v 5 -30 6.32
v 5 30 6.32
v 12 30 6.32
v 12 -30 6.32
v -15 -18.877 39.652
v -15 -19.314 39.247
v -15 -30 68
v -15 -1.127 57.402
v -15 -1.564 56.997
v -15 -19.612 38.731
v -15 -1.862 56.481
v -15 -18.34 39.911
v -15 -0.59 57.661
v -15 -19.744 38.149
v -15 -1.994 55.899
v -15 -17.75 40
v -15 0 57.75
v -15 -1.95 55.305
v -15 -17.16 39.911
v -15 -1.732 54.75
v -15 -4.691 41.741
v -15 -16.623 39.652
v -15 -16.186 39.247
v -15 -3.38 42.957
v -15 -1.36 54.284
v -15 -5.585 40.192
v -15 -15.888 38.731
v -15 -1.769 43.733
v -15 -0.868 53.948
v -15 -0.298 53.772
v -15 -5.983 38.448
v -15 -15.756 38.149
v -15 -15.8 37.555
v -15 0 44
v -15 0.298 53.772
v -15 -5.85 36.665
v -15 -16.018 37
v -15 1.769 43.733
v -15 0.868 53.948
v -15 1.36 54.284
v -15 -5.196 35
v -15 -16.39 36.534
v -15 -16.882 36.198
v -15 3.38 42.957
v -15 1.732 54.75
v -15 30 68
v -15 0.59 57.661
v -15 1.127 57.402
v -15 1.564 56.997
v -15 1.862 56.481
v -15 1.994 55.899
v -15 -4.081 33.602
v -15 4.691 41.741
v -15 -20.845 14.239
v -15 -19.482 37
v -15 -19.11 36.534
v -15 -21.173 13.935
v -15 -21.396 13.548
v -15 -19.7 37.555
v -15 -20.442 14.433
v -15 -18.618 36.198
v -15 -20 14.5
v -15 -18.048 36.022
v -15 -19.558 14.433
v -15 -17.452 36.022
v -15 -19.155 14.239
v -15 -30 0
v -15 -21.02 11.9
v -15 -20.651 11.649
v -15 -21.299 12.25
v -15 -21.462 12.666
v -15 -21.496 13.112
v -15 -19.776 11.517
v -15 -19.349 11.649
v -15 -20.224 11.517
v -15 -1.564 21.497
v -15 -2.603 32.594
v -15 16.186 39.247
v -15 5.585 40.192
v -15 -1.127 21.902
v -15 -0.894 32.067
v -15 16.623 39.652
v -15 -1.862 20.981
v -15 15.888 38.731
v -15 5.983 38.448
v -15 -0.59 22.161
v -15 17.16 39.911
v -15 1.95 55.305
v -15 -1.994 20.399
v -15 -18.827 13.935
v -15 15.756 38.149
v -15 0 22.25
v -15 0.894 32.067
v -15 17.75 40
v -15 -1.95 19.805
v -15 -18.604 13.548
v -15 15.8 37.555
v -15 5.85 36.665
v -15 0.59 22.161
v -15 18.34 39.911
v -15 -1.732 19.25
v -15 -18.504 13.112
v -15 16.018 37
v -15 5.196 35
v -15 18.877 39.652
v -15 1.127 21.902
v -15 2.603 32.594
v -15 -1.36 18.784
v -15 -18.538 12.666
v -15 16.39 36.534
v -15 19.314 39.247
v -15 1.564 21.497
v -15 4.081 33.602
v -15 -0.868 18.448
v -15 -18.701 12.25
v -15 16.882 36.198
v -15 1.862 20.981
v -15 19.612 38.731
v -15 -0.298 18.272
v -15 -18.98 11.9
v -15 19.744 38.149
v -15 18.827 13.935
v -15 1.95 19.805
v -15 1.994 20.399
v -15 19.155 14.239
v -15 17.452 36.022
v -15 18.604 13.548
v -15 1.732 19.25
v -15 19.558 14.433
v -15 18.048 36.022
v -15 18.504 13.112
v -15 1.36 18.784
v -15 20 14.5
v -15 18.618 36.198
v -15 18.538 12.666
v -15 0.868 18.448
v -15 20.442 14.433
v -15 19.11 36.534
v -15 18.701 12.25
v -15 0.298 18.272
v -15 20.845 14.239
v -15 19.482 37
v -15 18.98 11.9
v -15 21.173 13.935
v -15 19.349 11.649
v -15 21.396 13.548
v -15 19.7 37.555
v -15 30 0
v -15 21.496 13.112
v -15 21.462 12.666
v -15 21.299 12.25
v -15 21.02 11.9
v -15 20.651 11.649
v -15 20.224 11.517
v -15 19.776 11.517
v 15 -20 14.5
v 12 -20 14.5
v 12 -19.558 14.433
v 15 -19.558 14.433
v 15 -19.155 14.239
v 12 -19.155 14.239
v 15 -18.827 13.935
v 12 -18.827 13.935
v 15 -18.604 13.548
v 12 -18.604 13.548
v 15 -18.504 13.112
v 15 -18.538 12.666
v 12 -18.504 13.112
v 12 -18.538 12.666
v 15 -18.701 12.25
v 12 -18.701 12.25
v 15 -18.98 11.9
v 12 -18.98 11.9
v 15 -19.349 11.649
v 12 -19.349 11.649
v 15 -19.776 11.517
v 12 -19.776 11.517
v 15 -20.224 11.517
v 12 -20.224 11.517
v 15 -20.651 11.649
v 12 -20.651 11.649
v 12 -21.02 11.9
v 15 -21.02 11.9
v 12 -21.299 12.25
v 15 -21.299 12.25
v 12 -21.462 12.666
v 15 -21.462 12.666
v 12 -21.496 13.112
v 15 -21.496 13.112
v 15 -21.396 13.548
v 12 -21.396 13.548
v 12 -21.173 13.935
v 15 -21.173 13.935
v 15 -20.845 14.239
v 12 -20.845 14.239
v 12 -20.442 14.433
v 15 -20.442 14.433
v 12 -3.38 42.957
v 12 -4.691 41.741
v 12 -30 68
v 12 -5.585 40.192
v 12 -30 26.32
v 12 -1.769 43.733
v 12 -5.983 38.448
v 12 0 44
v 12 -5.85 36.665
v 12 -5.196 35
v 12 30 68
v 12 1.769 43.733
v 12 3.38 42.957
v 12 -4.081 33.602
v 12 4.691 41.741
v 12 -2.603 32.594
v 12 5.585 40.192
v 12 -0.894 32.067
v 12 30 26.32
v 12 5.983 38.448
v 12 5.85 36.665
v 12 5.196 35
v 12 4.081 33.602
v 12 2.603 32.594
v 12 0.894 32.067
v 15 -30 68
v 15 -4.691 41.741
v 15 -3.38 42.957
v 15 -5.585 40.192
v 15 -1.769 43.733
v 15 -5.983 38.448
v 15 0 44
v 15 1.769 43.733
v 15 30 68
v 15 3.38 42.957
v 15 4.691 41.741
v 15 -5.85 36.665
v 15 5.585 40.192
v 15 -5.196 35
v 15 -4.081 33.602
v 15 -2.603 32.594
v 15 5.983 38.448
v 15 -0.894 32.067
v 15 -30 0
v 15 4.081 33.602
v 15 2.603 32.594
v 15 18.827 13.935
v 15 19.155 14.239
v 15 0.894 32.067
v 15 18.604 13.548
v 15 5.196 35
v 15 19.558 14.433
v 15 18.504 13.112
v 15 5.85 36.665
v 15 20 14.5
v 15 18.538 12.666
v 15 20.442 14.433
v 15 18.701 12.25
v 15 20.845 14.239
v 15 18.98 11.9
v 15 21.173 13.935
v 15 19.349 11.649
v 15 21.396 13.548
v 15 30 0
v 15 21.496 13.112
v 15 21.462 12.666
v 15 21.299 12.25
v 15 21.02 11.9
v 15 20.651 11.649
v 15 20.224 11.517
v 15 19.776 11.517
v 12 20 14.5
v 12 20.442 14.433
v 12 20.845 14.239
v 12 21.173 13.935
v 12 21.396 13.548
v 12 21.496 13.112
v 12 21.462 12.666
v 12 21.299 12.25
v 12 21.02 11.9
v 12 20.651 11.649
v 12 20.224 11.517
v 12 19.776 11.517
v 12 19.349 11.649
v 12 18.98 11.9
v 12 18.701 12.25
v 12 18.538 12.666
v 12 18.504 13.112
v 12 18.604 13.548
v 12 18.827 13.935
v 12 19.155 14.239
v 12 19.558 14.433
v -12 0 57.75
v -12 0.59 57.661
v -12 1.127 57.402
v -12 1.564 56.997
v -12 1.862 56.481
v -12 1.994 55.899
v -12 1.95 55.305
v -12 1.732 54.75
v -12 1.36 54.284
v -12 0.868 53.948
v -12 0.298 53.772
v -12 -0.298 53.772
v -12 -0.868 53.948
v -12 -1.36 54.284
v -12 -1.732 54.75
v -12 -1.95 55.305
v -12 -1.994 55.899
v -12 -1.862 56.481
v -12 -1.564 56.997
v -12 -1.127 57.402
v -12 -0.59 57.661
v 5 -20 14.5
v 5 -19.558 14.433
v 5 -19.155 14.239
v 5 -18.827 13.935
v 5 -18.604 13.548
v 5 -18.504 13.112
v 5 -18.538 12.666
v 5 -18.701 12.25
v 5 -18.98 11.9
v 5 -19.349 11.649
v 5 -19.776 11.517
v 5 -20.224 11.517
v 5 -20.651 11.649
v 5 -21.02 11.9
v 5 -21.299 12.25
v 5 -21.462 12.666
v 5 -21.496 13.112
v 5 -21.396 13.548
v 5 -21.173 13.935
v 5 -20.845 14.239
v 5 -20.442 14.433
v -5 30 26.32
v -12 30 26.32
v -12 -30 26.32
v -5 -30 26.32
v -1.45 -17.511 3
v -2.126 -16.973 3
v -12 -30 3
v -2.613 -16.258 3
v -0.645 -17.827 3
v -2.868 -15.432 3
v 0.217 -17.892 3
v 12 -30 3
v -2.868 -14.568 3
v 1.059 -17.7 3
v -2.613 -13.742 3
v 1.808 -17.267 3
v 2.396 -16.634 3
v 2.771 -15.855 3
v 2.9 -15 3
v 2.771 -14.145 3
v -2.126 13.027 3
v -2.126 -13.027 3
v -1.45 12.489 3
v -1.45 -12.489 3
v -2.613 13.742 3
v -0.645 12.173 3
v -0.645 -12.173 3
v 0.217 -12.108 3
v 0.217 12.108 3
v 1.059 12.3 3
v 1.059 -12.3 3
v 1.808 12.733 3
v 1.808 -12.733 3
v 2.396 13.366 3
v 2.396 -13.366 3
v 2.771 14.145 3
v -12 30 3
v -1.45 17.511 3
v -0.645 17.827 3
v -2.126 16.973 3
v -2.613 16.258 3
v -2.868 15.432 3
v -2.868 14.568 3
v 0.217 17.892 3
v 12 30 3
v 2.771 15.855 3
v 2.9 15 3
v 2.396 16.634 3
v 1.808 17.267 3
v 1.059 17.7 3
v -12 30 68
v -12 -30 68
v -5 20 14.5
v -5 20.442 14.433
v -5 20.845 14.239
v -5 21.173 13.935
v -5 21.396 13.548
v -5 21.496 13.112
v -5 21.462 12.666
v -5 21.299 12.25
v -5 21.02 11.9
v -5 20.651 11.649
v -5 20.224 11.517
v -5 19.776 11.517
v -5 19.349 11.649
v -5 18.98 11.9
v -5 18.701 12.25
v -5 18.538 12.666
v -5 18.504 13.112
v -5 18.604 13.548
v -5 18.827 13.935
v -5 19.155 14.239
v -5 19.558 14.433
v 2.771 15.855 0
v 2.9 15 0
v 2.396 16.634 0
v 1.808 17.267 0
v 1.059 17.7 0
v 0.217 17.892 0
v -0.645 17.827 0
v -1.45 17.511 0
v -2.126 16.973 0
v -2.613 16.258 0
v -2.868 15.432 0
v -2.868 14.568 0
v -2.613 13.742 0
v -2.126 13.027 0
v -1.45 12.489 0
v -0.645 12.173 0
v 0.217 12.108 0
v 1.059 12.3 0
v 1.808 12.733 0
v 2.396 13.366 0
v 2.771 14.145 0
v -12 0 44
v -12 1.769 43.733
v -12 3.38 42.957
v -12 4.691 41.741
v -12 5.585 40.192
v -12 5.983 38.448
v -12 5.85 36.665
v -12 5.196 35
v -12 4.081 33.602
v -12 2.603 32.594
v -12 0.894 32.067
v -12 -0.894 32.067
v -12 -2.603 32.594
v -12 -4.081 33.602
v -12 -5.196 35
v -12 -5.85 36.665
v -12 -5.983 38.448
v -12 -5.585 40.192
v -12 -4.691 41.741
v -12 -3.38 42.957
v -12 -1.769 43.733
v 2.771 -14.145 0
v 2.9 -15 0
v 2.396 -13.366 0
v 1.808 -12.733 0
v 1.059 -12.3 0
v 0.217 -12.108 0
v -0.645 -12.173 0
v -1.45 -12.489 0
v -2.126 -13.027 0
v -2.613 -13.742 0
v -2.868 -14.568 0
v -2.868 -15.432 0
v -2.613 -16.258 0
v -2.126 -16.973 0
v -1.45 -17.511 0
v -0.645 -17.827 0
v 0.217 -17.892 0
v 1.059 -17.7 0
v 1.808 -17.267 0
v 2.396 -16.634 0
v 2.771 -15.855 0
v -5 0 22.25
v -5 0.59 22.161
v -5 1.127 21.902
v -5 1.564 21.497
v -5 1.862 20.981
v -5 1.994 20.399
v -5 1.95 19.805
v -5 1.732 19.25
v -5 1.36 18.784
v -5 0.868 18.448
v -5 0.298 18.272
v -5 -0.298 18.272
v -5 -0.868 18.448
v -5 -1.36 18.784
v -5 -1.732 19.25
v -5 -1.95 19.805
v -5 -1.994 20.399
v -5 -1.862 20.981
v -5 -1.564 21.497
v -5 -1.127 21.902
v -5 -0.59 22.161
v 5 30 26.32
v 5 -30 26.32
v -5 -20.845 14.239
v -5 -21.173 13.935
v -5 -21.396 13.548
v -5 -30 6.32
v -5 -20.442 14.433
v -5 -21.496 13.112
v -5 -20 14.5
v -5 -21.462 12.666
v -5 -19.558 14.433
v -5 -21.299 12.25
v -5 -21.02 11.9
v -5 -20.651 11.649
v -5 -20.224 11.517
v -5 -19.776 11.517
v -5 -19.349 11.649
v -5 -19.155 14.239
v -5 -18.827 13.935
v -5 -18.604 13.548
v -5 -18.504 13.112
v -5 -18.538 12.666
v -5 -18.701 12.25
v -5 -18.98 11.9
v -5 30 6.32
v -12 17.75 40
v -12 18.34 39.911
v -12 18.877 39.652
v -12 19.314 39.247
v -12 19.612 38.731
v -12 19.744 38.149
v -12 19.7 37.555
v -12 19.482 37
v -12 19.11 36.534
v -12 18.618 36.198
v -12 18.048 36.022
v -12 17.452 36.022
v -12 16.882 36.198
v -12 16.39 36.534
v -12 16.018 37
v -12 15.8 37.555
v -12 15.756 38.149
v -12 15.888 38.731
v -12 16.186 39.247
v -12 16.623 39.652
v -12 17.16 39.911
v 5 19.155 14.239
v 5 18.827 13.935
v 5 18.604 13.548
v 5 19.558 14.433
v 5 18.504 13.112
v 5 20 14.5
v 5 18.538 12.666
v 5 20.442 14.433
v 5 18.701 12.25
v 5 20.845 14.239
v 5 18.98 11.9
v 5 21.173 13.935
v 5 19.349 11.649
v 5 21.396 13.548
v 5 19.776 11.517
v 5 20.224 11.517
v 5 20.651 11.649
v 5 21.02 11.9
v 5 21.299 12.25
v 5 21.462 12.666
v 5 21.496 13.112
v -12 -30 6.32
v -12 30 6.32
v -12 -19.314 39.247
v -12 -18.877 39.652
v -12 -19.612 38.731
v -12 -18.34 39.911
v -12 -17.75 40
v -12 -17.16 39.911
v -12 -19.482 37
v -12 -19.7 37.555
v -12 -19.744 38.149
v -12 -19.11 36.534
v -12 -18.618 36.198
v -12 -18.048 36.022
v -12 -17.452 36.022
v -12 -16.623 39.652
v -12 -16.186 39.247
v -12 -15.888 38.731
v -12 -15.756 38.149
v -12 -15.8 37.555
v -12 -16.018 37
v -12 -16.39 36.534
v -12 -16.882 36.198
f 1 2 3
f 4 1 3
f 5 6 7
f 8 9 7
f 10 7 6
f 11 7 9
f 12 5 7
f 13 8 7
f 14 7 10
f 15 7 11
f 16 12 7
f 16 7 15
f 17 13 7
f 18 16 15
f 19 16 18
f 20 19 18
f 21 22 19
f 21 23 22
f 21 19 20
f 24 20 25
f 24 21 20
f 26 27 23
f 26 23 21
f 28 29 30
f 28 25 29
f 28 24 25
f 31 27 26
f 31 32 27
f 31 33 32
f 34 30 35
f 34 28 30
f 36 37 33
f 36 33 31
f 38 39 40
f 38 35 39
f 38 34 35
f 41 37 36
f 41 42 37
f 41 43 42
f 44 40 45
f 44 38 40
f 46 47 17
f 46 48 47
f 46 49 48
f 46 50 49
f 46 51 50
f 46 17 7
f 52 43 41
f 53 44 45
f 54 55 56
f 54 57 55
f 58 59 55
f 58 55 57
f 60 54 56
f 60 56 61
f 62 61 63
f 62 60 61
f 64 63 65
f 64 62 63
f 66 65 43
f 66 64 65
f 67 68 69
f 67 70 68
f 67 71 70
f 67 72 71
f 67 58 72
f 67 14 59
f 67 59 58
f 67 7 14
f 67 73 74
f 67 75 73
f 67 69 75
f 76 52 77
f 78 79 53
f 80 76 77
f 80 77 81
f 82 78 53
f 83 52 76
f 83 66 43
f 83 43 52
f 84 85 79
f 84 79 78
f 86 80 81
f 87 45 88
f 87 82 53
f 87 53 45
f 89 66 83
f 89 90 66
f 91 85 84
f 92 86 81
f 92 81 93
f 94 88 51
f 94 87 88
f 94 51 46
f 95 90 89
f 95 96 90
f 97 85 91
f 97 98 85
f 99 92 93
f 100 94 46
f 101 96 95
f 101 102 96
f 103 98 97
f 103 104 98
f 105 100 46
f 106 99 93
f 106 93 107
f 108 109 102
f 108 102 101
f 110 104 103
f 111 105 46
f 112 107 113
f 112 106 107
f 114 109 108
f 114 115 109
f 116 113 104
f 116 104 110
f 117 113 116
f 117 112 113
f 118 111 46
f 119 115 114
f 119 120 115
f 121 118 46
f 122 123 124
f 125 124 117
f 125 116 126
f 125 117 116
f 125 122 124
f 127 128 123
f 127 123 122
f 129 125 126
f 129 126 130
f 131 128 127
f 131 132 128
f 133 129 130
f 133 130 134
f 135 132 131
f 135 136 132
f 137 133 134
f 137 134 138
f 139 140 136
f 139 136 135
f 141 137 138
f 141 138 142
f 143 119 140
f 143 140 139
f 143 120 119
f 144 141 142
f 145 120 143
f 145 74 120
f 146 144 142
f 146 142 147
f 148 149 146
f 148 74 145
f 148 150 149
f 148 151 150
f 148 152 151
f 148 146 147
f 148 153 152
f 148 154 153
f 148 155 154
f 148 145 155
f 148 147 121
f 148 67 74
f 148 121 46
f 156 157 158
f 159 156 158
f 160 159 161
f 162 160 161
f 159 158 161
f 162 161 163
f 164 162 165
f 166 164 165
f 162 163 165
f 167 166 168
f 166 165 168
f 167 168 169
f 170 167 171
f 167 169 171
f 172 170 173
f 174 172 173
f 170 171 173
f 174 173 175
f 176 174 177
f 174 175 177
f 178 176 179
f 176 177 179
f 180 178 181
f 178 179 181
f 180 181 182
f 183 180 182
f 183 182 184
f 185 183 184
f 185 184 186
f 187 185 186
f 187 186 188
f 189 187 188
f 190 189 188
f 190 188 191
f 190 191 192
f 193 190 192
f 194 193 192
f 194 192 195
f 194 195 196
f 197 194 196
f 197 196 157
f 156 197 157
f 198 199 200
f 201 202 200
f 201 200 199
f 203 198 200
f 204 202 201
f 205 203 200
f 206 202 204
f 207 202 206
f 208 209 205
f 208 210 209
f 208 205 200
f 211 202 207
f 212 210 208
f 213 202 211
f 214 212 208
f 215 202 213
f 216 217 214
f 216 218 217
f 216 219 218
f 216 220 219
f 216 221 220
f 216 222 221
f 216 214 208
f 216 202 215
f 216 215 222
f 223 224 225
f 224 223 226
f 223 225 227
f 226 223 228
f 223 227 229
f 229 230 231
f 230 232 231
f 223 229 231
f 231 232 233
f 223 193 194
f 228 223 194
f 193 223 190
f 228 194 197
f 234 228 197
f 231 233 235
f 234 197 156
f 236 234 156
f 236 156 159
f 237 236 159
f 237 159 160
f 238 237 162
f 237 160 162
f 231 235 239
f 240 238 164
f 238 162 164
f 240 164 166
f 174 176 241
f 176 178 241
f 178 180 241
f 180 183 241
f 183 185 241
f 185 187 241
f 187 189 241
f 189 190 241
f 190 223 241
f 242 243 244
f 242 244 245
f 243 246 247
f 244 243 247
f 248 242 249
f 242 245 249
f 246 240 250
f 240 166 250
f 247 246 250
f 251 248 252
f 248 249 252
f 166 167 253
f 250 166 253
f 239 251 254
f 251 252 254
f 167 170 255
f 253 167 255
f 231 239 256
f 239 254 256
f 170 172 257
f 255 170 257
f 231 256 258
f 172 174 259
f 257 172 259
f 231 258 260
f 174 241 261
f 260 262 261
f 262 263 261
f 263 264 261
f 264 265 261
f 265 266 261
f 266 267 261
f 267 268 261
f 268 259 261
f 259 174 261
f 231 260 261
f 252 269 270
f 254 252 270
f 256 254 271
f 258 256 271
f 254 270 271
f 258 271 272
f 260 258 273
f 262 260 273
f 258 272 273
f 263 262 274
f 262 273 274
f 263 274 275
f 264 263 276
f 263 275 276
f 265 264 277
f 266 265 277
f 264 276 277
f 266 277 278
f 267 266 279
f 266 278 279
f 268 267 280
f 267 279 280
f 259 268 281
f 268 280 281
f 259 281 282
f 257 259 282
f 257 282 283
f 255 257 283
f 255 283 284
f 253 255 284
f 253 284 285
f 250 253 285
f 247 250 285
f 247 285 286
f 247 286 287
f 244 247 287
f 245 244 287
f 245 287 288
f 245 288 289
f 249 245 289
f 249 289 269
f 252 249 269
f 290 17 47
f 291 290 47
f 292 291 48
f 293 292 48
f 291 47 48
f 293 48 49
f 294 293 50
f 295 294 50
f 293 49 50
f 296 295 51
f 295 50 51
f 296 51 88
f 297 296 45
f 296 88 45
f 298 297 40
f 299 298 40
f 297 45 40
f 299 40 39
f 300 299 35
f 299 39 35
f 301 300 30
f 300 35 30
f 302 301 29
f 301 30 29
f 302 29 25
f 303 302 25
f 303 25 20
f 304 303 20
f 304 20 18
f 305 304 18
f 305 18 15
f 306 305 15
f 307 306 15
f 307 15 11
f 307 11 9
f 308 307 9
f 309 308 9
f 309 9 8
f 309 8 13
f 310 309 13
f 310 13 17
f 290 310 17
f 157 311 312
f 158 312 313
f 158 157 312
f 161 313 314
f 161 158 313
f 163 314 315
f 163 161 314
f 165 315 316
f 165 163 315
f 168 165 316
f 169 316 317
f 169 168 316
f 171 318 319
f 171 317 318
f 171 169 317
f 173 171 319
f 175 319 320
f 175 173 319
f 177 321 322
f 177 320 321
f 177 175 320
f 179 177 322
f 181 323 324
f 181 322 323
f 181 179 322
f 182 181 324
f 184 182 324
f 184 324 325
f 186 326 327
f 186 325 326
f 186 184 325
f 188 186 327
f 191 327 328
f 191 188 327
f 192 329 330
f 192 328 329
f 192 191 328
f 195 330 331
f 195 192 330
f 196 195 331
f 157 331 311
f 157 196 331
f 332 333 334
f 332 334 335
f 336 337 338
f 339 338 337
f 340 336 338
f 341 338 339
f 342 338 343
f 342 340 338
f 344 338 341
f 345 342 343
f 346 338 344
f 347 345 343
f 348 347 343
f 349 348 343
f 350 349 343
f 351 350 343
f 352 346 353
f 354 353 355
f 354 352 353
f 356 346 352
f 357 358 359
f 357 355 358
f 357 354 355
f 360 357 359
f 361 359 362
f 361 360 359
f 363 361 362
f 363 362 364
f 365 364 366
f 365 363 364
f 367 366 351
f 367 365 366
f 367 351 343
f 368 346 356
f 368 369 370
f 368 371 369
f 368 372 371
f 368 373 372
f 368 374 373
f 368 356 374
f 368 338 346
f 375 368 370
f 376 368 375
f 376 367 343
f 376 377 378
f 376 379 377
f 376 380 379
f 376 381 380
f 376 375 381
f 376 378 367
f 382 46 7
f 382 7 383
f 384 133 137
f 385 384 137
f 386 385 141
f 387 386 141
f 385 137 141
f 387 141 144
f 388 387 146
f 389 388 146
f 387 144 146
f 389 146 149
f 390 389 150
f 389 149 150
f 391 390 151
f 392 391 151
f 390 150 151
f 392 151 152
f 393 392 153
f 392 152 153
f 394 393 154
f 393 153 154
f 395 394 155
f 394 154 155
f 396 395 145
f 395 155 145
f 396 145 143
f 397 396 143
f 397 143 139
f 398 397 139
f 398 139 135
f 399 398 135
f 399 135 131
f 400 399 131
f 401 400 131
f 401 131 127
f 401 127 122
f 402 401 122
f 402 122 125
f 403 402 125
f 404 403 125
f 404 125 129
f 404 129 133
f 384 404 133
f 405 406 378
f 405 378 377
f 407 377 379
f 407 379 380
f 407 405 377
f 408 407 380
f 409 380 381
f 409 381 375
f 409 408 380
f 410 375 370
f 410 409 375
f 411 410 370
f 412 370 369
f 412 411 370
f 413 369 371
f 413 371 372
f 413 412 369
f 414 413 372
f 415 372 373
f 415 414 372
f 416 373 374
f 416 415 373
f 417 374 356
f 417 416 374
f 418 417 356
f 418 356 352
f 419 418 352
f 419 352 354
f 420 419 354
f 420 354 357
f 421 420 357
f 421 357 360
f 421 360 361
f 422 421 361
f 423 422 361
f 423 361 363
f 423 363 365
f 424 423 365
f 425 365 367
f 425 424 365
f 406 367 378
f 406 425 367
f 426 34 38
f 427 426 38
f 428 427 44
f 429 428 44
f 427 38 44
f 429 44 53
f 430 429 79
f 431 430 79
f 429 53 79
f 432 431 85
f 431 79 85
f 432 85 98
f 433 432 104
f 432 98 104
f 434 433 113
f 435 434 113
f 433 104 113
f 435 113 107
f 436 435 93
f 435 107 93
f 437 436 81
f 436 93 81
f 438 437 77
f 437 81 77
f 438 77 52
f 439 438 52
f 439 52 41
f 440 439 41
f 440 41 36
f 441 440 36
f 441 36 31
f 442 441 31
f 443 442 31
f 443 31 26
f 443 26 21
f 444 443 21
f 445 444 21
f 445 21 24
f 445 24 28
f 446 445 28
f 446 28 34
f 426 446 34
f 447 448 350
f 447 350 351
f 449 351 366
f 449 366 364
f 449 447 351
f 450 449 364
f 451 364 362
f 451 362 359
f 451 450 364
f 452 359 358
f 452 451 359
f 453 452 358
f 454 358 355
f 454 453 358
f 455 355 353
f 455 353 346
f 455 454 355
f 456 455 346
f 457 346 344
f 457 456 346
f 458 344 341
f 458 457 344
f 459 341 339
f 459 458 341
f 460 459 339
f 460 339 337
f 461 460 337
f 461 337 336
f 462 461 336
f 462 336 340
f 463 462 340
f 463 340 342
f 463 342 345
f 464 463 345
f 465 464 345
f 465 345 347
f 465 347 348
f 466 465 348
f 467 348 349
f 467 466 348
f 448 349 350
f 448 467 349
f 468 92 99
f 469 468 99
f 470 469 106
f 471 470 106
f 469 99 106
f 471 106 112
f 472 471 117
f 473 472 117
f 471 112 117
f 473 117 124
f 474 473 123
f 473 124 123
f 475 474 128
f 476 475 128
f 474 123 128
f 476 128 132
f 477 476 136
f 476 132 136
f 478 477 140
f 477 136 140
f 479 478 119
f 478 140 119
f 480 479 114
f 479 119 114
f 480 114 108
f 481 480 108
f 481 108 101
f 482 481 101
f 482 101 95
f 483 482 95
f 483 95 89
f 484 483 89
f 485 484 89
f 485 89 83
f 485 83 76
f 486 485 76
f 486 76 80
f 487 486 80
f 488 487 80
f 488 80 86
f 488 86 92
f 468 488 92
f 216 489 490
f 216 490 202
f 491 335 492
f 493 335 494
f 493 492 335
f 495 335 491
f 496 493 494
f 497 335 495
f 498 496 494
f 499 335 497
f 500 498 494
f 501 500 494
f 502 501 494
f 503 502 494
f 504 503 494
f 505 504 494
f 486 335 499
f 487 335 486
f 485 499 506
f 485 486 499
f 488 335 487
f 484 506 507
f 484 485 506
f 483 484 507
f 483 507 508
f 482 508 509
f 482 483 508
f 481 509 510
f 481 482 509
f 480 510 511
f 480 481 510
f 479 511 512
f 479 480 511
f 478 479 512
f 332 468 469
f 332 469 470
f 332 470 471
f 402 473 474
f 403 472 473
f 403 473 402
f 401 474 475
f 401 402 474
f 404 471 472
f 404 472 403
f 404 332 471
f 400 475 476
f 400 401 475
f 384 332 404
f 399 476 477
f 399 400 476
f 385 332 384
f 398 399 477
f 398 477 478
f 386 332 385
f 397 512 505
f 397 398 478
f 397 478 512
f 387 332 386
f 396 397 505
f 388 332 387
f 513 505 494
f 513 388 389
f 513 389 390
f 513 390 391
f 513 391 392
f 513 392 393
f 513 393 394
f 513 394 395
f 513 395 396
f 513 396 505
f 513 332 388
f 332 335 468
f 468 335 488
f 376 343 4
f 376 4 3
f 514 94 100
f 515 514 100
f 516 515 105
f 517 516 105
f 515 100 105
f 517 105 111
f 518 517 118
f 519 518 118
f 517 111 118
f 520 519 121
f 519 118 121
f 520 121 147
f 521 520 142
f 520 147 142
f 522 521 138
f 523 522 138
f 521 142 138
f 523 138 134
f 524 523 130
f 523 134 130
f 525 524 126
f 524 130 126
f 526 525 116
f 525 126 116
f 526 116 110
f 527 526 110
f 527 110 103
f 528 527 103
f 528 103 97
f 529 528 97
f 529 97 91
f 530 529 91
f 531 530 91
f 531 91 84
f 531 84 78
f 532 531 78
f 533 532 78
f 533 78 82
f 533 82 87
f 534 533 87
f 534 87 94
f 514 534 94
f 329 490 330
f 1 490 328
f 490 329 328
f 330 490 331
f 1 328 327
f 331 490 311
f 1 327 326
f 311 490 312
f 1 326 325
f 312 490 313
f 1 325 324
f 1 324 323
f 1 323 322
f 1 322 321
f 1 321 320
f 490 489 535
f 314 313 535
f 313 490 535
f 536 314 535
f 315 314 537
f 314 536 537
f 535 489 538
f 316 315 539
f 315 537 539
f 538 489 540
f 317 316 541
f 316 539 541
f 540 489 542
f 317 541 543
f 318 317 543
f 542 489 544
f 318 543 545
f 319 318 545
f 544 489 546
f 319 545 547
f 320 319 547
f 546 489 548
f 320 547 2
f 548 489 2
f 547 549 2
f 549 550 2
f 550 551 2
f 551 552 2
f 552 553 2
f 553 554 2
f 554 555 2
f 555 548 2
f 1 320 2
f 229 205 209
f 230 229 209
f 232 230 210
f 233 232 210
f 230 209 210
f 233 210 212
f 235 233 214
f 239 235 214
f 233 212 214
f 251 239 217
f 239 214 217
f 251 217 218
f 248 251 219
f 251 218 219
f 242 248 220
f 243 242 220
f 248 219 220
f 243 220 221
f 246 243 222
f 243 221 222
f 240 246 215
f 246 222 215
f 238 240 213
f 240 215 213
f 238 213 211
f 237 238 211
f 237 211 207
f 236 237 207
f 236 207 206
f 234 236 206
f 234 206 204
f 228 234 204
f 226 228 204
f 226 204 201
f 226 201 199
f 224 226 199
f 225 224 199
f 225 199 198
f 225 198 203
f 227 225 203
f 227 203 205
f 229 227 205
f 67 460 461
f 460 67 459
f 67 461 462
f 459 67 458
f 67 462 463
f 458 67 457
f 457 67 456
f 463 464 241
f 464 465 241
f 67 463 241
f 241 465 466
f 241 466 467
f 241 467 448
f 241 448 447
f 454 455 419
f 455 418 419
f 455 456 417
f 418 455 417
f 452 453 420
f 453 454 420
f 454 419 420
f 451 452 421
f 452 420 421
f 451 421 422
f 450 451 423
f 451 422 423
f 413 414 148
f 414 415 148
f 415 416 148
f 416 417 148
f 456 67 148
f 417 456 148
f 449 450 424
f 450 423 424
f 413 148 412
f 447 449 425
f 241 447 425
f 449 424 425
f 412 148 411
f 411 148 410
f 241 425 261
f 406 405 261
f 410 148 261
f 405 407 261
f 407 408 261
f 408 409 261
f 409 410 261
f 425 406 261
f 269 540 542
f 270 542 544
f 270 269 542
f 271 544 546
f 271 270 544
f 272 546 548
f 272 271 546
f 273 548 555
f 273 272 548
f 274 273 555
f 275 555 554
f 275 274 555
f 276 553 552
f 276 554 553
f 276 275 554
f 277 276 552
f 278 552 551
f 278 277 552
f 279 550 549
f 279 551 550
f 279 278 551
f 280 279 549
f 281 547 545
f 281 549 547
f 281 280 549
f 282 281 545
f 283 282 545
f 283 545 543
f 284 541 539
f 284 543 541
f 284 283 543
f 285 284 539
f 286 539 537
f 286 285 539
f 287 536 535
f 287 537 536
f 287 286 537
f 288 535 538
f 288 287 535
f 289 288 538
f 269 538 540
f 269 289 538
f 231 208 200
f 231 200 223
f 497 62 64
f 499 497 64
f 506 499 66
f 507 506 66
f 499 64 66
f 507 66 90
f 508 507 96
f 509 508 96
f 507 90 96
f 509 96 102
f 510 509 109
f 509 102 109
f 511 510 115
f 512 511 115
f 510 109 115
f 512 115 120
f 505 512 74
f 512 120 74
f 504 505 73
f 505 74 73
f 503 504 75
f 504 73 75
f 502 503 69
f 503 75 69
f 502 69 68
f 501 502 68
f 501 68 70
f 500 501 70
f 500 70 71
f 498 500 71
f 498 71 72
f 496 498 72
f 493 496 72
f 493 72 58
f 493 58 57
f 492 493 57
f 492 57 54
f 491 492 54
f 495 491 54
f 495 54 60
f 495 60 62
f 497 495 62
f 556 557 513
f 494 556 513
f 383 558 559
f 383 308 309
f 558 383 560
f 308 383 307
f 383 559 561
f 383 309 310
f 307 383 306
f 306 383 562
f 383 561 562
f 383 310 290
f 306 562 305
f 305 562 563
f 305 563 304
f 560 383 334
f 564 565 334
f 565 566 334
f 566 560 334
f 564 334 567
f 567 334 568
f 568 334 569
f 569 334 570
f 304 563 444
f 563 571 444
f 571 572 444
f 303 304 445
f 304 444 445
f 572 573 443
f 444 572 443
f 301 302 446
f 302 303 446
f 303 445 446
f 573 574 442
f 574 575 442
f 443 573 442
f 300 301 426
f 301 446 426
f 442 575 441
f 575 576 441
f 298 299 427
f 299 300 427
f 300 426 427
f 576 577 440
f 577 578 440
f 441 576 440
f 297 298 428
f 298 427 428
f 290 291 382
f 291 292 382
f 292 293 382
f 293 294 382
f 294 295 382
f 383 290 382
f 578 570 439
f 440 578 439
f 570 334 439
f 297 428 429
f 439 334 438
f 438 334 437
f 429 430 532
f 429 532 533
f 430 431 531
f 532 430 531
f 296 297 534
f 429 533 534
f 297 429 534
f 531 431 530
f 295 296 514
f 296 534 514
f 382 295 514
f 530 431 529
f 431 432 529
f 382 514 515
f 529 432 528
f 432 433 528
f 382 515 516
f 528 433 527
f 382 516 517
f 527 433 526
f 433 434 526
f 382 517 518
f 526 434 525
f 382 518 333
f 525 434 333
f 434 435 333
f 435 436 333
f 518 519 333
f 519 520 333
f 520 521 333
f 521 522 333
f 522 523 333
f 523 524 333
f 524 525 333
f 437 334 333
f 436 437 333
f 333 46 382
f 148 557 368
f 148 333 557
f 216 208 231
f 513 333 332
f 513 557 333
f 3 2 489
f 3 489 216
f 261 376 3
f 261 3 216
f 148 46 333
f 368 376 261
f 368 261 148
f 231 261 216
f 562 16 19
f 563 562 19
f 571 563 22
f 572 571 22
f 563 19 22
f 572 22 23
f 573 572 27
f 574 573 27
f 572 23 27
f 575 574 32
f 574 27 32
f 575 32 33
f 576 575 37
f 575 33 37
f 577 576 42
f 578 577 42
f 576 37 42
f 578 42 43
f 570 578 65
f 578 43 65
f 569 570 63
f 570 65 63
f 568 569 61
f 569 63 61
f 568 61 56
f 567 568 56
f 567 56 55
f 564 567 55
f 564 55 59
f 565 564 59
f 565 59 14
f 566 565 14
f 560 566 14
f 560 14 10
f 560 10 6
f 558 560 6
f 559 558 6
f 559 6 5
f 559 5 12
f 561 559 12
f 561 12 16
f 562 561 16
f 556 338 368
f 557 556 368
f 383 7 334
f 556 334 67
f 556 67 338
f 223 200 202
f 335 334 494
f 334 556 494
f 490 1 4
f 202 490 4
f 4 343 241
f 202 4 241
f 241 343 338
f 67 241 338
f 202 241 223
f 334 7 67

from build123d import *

# Parameters (mm, degrees)
SKETCH1_W               = 30
SKETCH1_H               = 60
SKETCH1_R               = 2.9
BOSS_EXTRUDE1_DEPTH     = 3
SKETCH2_W               = 3
SKETCH2_H               = 60
BOSS_EXTRUDE2_DEPTH     = 65
SKETCH5_W               = 7
SKETCH5_H               = 20
BOSS_EXTRUDE3_DEPTH     = 60
CUT_EXTRUDE1_REACH      = 32
SKETCH3_R               = 1.5
SKETCH3_R_2             = 6
SKETCH3_R_3             = 2
SKETCH4_R               = 1.5
SKETCH4_R_2             = 6
CUT_EXTRUDE2_DEPTH      = 28
CUT_EXTRUDE2_DEPTH_BACK = 4


with BuildPart() as part:
    # Sketch1 → Boss-Extrude1 (new body)
    with BuildSketch(Plane.XY):
        Rectangle(SKETCH1_W, SKETCH1_H)
        with Locations((0, 15)):
            Circle(SKETCH1_R, mode=Mode.SUBTRACT)
        with Locations((0, -15)):
            Circle(SKETCH1_R, mode=Mode.SUBTRACT)
    extrude(amount=BOSS_EXTRUDE1_DEPTH)

    # Sketch2 → Boss-Extrude2 (add)
    with BuildSketch(Plane.XY.offset(3)):
        with Locations((-13.5, 0)):
            Rectangle(SKETCH2_W, SKETCH2_H)
        with Locations((13.5, 0)):
            Rectangle(SKETCH2_W, SKETCH2_H)
    extrude(amount=BOSS_EXTRUDE2_DEPTH)

    # Sketch5 → Boss-Extrude3 (add)
    with BuildSketch(Plane(origin=(0, 30, 0), x_dir=(1, 0, 0), z_dir=(0, 1, 0))):
        with Locations((8.5, -16.320138996)):
            Rectangle(SKETCH5_W, SKETCH5_H)
        with Locations((-8.5, -16.320138996)):
            Rectangle(SKETCH5_W, SKETCH5_H)
    extrude(amount=-BOSS_EXTRUDE3_DEPTH)

    # Sketch3 → Cut-Extrude1 (cut, up to next)
    with BuildSketch(Plane.ZY.offset(15), mode=Mode.PRIVATE) as cut_extrude1_sk1:
        with Locations((13, 20)):
            Circle(SKETCH3_R)
    cut_extrude1_tool1 = extrude(cut_extrude1_sk1.sketch, amount=-CUT_EXTRUDE1_REACH, mode=Mode.PRIVATE) & part.part
    add(cut_extrude1_tool1.solids().sort_by_distance((-15, 20, 13))[0], mode=Mode.SUBTRACT)
    # Sketch3 → Cut-Extrude1 (cut, up to next)
    with BuildSketch(Plane.ZY.offset(15), mode=Mode.PRIVATE) as cut_extrude1_sk2:
        with Locations((38, 0)):
            Circle(SKETCH3_R_2)
    cut_extrude1_tool2 = extrude(cut_extrude1_sk2.sketch, amount=-CUT_EXTRUDE1_REACH, mode=Mode.PRIVATE) & part.part
    add(cut_extrude1_tool2.solids().sort_by_distance((-15, 0, 38))[0], mode=Mode.SUBTRACT)
    # Sketch3 → Cut-Extrude1 (cut, up to next)
    with BuildSketch(Plane.ZY.offset(15), mode=Mode.PRIVATE) as cut_extrude1_sk3:
        with Locations((20.25, 0)):
            Circle(SKETCH3_R_3)
    cut_extrude1_tool3 = extrude(cut_extrude1_sk3.sketch, amount=-CUT_EXTRUDE1_REACH, mode=Mode.PRIVATE) & part.part
    add(cut_extrude1_tool3.solids().sort_by_distance((-15, 0, 20.25))[0], mode=Mode.SUBTRACT)
    # Sketch3 → Cut-Extrude1 (cut, up to next)
    with BuildSketch(Plane.ZY.offset(15), mode=Mode.PRIVATE) as cut_extrude1_sk4:
        with Locations((38, 17.75)):
            Circle(SKETCH3_R_3)
    cut_extrude1_tool4 = extrude(cut_extrude1_sk4.sketch, amount=-CUT_EXTRUDE1_REACH, mode=Mode.PRIVATE) & part.part
    add(cut_extrude1_tool4.solids().sort_by_distance((-15, 17.75, 38))[0], mode=Mode.SUBTRACT)
    # Sketch3 → Cut-Extrude1 (cut, up to next)
    with BuildSketch(Plane.ZY.offset(15), mode=Mode.PRIVATE) as cut_extrude1_sk5:
        with Locations((55.75, 0)):
            Circle(SKETCH3_R_3)
    cut_extrude1_tool5 = extrude(cut_extrude1_sk5.sketch, amount=-CUT_EXTRUDE1_REACH, mode=Mode.PRIVATE) & part.part
    add(cut_extrude1_tool5.solids().sort_by_distance((-15, 0, 55.75))[0], mode=Mode.SUBTRACT)
    # Sketch3 → Cut-Extrude1 (cut, up to next)
    with BuildSketch(Plane.ZY.offset(15), mode=Mode.PRIVATE) as cut_extrude1_sk6:
        with Locations((38, -17.75)):
            Circle(SKETCH3_R_3)
    cut_extrude1_tool6 = extrude(cut_extrude1_sk6.sketch, amount=-CUT_EXTRUDE1_REACH, mode=Mode.PRIVATE) & part.part
    add(cut_extrude1_tool6.solids().sort_by_distance((-15, -17.75, 38))[0], mode=Mode.SUBTRACT)
    # Sketch3 → Cut-Extrude1 (cut, up to next)
    with BuildSketch(Plane.ZY.offset(15), mode=Mode.PRIVATE) as cut_extrude1_sk7:
        with Locations((13, -20)):
            Circle(SKETCH3_R)
    cut_extrude1_tool7 = extrude(cut_extrude1_sk7.sketch, amount=-CUT_EXTRUDE1_REACH, mode=Mode.PRIVATE) & part.part
    add(cut_extrude1_tool7.solids().sort_by_distance((-15, -20, 13))[0], mode=Mode.SUBTRACT)

    # Sketch4 → Cut-Extrude2 (cut, two sides)
    with BuildSketch(Plane.ZY.offset(-12)) as cut_extrude2_sk:
        with Locations((13, -20)):
            Circle(SKETCH4_R)
        with Locations((13, 20)):
            Circle(SKETCH4_R)
        with Locations((38, 0)):
            Circle(SKETCH4_R_2)
    extrude(amount=CUT_EXTRUDE2_DEPTH, mode=Mode.SUBTRACT)
    extrude(cut_extrude2_sk.sketch, amount=-CUT_EXTRUDE2_DEPTH_BACK, mode=Mode.SUBTRACT)


solid = part.part
